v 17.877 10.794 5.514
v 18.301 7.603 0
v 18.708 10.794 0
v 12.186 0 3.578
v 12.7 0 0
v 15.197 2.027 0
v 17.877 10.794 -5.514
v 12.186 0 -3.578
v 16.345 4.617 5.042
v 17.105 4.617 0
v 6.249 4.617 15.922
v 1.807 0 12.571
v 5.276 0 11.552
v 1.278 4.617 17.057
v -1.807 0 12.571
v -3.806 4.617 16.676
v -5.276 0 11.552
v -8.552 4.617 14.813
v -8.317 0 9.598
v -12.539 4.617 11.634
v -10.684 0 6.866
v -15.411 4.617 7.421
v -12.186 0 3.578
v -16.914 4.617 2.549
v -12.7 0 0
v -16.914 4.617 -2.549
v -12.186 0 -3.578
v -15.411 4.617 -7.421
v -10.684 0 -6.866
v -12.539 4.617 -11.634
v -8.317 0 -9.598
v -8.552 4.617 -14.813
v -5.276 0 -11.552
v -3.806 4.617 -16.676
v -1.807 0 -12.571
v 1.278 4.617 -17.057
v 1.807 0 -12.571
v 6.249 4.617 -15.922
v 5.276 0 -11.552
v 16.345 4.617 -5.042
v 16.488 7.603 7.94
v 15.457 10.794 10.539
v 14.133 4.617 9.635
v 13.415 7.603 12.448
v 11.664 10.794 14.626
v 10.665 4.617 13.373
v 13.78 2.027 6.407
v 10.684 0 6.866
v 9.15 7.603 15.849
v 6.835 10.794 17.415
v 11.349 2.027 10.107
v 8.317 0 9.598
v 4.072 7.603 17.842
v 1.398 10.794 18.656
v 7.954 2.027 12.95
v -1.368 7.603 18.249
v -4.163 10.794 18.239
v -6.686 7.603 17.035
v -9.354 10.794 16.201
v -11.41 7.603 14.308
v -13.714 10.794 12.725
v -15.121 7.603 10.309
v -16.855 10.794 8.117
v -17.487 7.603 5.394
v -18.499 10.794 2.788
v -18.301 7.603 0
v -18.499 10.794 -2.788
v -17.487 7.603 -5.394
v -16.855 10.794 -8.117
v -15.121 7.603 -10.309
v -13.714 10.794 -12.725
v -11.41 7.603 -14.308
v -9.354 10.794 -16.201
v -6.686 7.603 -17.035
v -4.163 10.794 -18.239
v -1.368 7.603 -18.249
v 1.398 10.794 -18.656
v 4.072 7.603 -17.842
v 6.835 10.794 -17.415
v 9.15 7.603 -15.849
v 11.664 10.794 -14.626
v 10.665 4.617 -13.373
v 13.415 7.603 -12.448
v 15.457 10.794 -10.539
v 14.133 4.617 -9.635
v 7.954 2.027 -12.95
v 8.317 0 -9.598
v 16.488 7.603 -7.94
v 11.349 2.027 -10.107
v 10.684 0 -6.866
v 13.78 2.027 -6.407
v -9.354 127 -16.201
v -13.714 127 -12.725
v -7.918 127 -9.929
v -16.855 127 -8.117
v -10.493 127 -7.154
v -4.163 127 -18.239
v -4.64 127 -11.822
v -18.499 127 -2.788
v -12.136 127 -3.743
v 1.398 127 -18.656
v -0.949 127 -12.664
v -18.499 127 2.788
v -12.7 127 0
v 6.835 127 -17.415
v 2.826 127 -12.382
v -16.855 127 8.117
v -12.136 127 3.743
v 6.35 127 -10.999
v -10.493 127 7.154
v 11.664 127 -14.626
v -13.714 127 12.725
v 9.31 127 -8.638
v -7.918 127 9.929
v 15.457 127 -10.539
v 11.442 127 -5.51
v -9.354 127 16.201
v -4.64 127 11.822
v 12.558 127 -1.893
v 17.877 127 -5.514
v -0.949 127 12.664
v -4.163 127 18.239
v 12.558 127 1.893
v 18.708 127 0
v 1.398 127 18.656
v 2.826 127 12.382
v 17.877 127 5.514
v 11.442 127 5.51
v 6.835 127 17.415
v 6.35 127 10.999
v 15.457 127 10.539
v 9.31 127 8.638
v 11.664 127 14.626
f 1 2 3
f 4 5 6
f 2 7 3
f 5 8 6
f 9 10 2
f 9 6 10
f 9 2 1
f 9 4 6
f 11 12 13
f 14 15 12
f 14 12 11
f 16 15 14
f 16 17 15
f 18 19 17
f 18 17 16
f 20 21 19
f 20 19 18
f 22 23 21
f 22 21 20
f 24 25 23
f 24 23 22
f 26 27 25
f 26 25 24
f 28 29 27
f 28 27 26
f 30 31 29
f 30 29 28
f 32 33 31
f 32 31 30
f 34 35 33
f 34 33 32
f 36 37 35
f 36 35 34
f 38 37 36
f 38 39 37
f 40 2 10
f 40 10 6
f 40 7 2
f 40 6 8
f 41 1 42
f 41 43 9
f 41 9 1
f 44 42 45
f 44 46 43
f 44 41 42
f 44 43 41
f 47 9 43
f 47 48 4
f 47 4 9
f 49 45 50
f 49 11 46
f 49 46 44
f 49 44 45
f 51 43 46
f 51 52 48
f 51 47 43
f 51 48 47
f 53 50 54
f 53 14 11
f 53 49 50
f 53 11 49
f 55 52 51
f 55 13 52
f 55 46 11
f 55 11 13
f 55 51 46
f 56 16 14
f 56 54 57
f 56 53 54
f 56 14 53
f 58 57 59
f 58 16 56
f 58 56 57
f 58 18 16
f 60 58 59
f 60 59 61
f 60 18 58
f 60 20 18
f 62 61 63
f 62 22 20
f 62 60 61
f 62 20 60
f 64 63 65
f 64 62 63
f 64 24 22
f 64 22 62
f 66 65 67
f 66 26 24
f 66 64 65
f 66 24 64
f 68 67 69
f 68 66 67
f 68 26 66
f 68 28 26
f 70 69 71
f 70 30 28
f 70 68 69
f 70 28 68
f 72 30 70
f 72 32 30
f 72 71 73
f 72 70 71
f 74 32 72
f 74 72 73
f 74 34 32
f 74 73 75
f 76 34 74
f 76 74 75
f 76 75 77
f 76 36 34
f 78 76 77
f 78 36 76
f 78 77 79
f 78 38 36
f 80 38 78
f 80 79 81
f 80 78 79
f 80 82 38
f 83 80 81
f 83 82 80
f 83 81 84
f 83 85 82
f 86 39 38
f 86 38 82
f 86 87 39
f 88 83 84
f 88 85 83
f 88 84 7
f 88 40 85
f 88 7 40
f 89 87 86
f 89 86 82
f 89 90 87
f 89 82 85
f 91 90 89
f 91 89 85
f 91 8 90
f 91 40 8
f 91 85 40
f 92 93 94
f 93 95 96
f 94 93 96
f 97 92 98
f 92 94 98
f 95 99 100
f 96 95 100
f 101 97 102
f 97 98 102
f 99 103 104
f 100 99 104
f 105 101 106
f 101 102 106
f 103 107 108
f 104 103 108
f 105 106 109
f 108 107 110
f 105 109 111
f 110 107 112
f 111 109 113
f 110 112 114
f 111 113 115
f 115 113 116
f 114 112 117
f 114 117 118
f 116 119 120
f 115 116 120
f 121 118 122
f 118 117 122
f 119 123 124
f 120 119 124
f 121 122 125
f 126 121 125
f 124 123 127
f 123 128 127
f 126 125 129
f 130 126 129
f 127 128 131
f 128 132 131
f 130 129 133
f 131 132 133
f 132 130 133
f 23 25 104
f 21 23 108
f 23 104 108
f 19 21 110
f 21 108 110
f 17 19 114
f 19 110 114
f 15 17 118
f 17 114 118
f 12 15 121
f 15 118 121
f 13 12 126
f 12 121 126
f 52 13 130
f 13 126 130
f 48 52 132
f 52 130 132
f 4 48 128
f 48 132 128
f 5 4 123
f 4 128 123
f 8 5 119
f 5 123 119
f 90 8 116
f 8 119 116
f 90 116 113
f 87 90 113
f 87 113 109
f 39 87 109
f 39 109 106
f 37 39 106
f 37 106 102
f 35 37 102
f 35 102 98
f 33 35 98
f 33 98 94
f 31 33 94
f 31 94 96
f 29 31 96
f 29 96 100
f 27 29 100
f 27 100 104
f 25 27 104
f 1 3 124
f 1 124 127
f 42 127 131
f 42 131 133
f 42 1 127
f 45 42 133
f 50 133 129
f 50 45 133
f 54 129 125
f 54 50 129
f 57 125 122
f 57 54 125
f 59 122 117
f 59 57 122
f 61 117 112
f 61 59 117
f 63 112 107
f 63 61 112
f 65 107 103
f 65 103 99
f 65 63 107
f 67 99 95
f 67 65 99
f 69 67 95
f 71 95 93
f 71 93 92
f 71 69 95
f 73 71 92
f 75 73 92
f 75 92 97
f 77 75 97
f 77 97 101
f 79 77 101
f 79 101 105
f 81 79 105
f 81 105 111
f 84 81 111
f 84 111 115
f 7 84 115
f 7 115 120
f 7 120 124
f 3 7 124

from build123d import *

# Parameters (mm, degrees)
F0_R     = 18.707853832
F1_DEPTH = 127
F3_D     = 25.4


# Not quite as in the source:
# - a fillet or chamfer that OpenCascade refuses, or shapes differently, is made with other operations: its cross-section is extruded or revolved along the edge and cut away or added


with BuildPart() as f1:
    # F0 (on Front) → F1 (new body)
    with BuildSketch(Plane.XZ):
        Circle(F0_R)
    extrude(amount=-F1_DEPTH)

    # F3 (through all)
    with Locations(Plane.XZ):
        with Locations((0, 0)):
            Hole(F3_D / 2)

    # F4: fillet of radius 12.7 on 1 edges, made by hand

    # F4_s1 → F4_t2 (revolve, cut)
    with BuildSketch(Plane.XY):
        with BuildLine():
            ThreePointArc((18.707853832, 10.7937565132), (17.1047060058, 4.6171982618), (12.7, 0))
            Line((12.7, 0), (18.707853832, 0))
            Line((18.707853832, 0), (18.707853832, 10.7937565132))
        make_face()
    revolve(axis=Axis((0, 0, 0), (0, -1, 0)), mode=Mode.SUBTRACT)


solid = f1.part
